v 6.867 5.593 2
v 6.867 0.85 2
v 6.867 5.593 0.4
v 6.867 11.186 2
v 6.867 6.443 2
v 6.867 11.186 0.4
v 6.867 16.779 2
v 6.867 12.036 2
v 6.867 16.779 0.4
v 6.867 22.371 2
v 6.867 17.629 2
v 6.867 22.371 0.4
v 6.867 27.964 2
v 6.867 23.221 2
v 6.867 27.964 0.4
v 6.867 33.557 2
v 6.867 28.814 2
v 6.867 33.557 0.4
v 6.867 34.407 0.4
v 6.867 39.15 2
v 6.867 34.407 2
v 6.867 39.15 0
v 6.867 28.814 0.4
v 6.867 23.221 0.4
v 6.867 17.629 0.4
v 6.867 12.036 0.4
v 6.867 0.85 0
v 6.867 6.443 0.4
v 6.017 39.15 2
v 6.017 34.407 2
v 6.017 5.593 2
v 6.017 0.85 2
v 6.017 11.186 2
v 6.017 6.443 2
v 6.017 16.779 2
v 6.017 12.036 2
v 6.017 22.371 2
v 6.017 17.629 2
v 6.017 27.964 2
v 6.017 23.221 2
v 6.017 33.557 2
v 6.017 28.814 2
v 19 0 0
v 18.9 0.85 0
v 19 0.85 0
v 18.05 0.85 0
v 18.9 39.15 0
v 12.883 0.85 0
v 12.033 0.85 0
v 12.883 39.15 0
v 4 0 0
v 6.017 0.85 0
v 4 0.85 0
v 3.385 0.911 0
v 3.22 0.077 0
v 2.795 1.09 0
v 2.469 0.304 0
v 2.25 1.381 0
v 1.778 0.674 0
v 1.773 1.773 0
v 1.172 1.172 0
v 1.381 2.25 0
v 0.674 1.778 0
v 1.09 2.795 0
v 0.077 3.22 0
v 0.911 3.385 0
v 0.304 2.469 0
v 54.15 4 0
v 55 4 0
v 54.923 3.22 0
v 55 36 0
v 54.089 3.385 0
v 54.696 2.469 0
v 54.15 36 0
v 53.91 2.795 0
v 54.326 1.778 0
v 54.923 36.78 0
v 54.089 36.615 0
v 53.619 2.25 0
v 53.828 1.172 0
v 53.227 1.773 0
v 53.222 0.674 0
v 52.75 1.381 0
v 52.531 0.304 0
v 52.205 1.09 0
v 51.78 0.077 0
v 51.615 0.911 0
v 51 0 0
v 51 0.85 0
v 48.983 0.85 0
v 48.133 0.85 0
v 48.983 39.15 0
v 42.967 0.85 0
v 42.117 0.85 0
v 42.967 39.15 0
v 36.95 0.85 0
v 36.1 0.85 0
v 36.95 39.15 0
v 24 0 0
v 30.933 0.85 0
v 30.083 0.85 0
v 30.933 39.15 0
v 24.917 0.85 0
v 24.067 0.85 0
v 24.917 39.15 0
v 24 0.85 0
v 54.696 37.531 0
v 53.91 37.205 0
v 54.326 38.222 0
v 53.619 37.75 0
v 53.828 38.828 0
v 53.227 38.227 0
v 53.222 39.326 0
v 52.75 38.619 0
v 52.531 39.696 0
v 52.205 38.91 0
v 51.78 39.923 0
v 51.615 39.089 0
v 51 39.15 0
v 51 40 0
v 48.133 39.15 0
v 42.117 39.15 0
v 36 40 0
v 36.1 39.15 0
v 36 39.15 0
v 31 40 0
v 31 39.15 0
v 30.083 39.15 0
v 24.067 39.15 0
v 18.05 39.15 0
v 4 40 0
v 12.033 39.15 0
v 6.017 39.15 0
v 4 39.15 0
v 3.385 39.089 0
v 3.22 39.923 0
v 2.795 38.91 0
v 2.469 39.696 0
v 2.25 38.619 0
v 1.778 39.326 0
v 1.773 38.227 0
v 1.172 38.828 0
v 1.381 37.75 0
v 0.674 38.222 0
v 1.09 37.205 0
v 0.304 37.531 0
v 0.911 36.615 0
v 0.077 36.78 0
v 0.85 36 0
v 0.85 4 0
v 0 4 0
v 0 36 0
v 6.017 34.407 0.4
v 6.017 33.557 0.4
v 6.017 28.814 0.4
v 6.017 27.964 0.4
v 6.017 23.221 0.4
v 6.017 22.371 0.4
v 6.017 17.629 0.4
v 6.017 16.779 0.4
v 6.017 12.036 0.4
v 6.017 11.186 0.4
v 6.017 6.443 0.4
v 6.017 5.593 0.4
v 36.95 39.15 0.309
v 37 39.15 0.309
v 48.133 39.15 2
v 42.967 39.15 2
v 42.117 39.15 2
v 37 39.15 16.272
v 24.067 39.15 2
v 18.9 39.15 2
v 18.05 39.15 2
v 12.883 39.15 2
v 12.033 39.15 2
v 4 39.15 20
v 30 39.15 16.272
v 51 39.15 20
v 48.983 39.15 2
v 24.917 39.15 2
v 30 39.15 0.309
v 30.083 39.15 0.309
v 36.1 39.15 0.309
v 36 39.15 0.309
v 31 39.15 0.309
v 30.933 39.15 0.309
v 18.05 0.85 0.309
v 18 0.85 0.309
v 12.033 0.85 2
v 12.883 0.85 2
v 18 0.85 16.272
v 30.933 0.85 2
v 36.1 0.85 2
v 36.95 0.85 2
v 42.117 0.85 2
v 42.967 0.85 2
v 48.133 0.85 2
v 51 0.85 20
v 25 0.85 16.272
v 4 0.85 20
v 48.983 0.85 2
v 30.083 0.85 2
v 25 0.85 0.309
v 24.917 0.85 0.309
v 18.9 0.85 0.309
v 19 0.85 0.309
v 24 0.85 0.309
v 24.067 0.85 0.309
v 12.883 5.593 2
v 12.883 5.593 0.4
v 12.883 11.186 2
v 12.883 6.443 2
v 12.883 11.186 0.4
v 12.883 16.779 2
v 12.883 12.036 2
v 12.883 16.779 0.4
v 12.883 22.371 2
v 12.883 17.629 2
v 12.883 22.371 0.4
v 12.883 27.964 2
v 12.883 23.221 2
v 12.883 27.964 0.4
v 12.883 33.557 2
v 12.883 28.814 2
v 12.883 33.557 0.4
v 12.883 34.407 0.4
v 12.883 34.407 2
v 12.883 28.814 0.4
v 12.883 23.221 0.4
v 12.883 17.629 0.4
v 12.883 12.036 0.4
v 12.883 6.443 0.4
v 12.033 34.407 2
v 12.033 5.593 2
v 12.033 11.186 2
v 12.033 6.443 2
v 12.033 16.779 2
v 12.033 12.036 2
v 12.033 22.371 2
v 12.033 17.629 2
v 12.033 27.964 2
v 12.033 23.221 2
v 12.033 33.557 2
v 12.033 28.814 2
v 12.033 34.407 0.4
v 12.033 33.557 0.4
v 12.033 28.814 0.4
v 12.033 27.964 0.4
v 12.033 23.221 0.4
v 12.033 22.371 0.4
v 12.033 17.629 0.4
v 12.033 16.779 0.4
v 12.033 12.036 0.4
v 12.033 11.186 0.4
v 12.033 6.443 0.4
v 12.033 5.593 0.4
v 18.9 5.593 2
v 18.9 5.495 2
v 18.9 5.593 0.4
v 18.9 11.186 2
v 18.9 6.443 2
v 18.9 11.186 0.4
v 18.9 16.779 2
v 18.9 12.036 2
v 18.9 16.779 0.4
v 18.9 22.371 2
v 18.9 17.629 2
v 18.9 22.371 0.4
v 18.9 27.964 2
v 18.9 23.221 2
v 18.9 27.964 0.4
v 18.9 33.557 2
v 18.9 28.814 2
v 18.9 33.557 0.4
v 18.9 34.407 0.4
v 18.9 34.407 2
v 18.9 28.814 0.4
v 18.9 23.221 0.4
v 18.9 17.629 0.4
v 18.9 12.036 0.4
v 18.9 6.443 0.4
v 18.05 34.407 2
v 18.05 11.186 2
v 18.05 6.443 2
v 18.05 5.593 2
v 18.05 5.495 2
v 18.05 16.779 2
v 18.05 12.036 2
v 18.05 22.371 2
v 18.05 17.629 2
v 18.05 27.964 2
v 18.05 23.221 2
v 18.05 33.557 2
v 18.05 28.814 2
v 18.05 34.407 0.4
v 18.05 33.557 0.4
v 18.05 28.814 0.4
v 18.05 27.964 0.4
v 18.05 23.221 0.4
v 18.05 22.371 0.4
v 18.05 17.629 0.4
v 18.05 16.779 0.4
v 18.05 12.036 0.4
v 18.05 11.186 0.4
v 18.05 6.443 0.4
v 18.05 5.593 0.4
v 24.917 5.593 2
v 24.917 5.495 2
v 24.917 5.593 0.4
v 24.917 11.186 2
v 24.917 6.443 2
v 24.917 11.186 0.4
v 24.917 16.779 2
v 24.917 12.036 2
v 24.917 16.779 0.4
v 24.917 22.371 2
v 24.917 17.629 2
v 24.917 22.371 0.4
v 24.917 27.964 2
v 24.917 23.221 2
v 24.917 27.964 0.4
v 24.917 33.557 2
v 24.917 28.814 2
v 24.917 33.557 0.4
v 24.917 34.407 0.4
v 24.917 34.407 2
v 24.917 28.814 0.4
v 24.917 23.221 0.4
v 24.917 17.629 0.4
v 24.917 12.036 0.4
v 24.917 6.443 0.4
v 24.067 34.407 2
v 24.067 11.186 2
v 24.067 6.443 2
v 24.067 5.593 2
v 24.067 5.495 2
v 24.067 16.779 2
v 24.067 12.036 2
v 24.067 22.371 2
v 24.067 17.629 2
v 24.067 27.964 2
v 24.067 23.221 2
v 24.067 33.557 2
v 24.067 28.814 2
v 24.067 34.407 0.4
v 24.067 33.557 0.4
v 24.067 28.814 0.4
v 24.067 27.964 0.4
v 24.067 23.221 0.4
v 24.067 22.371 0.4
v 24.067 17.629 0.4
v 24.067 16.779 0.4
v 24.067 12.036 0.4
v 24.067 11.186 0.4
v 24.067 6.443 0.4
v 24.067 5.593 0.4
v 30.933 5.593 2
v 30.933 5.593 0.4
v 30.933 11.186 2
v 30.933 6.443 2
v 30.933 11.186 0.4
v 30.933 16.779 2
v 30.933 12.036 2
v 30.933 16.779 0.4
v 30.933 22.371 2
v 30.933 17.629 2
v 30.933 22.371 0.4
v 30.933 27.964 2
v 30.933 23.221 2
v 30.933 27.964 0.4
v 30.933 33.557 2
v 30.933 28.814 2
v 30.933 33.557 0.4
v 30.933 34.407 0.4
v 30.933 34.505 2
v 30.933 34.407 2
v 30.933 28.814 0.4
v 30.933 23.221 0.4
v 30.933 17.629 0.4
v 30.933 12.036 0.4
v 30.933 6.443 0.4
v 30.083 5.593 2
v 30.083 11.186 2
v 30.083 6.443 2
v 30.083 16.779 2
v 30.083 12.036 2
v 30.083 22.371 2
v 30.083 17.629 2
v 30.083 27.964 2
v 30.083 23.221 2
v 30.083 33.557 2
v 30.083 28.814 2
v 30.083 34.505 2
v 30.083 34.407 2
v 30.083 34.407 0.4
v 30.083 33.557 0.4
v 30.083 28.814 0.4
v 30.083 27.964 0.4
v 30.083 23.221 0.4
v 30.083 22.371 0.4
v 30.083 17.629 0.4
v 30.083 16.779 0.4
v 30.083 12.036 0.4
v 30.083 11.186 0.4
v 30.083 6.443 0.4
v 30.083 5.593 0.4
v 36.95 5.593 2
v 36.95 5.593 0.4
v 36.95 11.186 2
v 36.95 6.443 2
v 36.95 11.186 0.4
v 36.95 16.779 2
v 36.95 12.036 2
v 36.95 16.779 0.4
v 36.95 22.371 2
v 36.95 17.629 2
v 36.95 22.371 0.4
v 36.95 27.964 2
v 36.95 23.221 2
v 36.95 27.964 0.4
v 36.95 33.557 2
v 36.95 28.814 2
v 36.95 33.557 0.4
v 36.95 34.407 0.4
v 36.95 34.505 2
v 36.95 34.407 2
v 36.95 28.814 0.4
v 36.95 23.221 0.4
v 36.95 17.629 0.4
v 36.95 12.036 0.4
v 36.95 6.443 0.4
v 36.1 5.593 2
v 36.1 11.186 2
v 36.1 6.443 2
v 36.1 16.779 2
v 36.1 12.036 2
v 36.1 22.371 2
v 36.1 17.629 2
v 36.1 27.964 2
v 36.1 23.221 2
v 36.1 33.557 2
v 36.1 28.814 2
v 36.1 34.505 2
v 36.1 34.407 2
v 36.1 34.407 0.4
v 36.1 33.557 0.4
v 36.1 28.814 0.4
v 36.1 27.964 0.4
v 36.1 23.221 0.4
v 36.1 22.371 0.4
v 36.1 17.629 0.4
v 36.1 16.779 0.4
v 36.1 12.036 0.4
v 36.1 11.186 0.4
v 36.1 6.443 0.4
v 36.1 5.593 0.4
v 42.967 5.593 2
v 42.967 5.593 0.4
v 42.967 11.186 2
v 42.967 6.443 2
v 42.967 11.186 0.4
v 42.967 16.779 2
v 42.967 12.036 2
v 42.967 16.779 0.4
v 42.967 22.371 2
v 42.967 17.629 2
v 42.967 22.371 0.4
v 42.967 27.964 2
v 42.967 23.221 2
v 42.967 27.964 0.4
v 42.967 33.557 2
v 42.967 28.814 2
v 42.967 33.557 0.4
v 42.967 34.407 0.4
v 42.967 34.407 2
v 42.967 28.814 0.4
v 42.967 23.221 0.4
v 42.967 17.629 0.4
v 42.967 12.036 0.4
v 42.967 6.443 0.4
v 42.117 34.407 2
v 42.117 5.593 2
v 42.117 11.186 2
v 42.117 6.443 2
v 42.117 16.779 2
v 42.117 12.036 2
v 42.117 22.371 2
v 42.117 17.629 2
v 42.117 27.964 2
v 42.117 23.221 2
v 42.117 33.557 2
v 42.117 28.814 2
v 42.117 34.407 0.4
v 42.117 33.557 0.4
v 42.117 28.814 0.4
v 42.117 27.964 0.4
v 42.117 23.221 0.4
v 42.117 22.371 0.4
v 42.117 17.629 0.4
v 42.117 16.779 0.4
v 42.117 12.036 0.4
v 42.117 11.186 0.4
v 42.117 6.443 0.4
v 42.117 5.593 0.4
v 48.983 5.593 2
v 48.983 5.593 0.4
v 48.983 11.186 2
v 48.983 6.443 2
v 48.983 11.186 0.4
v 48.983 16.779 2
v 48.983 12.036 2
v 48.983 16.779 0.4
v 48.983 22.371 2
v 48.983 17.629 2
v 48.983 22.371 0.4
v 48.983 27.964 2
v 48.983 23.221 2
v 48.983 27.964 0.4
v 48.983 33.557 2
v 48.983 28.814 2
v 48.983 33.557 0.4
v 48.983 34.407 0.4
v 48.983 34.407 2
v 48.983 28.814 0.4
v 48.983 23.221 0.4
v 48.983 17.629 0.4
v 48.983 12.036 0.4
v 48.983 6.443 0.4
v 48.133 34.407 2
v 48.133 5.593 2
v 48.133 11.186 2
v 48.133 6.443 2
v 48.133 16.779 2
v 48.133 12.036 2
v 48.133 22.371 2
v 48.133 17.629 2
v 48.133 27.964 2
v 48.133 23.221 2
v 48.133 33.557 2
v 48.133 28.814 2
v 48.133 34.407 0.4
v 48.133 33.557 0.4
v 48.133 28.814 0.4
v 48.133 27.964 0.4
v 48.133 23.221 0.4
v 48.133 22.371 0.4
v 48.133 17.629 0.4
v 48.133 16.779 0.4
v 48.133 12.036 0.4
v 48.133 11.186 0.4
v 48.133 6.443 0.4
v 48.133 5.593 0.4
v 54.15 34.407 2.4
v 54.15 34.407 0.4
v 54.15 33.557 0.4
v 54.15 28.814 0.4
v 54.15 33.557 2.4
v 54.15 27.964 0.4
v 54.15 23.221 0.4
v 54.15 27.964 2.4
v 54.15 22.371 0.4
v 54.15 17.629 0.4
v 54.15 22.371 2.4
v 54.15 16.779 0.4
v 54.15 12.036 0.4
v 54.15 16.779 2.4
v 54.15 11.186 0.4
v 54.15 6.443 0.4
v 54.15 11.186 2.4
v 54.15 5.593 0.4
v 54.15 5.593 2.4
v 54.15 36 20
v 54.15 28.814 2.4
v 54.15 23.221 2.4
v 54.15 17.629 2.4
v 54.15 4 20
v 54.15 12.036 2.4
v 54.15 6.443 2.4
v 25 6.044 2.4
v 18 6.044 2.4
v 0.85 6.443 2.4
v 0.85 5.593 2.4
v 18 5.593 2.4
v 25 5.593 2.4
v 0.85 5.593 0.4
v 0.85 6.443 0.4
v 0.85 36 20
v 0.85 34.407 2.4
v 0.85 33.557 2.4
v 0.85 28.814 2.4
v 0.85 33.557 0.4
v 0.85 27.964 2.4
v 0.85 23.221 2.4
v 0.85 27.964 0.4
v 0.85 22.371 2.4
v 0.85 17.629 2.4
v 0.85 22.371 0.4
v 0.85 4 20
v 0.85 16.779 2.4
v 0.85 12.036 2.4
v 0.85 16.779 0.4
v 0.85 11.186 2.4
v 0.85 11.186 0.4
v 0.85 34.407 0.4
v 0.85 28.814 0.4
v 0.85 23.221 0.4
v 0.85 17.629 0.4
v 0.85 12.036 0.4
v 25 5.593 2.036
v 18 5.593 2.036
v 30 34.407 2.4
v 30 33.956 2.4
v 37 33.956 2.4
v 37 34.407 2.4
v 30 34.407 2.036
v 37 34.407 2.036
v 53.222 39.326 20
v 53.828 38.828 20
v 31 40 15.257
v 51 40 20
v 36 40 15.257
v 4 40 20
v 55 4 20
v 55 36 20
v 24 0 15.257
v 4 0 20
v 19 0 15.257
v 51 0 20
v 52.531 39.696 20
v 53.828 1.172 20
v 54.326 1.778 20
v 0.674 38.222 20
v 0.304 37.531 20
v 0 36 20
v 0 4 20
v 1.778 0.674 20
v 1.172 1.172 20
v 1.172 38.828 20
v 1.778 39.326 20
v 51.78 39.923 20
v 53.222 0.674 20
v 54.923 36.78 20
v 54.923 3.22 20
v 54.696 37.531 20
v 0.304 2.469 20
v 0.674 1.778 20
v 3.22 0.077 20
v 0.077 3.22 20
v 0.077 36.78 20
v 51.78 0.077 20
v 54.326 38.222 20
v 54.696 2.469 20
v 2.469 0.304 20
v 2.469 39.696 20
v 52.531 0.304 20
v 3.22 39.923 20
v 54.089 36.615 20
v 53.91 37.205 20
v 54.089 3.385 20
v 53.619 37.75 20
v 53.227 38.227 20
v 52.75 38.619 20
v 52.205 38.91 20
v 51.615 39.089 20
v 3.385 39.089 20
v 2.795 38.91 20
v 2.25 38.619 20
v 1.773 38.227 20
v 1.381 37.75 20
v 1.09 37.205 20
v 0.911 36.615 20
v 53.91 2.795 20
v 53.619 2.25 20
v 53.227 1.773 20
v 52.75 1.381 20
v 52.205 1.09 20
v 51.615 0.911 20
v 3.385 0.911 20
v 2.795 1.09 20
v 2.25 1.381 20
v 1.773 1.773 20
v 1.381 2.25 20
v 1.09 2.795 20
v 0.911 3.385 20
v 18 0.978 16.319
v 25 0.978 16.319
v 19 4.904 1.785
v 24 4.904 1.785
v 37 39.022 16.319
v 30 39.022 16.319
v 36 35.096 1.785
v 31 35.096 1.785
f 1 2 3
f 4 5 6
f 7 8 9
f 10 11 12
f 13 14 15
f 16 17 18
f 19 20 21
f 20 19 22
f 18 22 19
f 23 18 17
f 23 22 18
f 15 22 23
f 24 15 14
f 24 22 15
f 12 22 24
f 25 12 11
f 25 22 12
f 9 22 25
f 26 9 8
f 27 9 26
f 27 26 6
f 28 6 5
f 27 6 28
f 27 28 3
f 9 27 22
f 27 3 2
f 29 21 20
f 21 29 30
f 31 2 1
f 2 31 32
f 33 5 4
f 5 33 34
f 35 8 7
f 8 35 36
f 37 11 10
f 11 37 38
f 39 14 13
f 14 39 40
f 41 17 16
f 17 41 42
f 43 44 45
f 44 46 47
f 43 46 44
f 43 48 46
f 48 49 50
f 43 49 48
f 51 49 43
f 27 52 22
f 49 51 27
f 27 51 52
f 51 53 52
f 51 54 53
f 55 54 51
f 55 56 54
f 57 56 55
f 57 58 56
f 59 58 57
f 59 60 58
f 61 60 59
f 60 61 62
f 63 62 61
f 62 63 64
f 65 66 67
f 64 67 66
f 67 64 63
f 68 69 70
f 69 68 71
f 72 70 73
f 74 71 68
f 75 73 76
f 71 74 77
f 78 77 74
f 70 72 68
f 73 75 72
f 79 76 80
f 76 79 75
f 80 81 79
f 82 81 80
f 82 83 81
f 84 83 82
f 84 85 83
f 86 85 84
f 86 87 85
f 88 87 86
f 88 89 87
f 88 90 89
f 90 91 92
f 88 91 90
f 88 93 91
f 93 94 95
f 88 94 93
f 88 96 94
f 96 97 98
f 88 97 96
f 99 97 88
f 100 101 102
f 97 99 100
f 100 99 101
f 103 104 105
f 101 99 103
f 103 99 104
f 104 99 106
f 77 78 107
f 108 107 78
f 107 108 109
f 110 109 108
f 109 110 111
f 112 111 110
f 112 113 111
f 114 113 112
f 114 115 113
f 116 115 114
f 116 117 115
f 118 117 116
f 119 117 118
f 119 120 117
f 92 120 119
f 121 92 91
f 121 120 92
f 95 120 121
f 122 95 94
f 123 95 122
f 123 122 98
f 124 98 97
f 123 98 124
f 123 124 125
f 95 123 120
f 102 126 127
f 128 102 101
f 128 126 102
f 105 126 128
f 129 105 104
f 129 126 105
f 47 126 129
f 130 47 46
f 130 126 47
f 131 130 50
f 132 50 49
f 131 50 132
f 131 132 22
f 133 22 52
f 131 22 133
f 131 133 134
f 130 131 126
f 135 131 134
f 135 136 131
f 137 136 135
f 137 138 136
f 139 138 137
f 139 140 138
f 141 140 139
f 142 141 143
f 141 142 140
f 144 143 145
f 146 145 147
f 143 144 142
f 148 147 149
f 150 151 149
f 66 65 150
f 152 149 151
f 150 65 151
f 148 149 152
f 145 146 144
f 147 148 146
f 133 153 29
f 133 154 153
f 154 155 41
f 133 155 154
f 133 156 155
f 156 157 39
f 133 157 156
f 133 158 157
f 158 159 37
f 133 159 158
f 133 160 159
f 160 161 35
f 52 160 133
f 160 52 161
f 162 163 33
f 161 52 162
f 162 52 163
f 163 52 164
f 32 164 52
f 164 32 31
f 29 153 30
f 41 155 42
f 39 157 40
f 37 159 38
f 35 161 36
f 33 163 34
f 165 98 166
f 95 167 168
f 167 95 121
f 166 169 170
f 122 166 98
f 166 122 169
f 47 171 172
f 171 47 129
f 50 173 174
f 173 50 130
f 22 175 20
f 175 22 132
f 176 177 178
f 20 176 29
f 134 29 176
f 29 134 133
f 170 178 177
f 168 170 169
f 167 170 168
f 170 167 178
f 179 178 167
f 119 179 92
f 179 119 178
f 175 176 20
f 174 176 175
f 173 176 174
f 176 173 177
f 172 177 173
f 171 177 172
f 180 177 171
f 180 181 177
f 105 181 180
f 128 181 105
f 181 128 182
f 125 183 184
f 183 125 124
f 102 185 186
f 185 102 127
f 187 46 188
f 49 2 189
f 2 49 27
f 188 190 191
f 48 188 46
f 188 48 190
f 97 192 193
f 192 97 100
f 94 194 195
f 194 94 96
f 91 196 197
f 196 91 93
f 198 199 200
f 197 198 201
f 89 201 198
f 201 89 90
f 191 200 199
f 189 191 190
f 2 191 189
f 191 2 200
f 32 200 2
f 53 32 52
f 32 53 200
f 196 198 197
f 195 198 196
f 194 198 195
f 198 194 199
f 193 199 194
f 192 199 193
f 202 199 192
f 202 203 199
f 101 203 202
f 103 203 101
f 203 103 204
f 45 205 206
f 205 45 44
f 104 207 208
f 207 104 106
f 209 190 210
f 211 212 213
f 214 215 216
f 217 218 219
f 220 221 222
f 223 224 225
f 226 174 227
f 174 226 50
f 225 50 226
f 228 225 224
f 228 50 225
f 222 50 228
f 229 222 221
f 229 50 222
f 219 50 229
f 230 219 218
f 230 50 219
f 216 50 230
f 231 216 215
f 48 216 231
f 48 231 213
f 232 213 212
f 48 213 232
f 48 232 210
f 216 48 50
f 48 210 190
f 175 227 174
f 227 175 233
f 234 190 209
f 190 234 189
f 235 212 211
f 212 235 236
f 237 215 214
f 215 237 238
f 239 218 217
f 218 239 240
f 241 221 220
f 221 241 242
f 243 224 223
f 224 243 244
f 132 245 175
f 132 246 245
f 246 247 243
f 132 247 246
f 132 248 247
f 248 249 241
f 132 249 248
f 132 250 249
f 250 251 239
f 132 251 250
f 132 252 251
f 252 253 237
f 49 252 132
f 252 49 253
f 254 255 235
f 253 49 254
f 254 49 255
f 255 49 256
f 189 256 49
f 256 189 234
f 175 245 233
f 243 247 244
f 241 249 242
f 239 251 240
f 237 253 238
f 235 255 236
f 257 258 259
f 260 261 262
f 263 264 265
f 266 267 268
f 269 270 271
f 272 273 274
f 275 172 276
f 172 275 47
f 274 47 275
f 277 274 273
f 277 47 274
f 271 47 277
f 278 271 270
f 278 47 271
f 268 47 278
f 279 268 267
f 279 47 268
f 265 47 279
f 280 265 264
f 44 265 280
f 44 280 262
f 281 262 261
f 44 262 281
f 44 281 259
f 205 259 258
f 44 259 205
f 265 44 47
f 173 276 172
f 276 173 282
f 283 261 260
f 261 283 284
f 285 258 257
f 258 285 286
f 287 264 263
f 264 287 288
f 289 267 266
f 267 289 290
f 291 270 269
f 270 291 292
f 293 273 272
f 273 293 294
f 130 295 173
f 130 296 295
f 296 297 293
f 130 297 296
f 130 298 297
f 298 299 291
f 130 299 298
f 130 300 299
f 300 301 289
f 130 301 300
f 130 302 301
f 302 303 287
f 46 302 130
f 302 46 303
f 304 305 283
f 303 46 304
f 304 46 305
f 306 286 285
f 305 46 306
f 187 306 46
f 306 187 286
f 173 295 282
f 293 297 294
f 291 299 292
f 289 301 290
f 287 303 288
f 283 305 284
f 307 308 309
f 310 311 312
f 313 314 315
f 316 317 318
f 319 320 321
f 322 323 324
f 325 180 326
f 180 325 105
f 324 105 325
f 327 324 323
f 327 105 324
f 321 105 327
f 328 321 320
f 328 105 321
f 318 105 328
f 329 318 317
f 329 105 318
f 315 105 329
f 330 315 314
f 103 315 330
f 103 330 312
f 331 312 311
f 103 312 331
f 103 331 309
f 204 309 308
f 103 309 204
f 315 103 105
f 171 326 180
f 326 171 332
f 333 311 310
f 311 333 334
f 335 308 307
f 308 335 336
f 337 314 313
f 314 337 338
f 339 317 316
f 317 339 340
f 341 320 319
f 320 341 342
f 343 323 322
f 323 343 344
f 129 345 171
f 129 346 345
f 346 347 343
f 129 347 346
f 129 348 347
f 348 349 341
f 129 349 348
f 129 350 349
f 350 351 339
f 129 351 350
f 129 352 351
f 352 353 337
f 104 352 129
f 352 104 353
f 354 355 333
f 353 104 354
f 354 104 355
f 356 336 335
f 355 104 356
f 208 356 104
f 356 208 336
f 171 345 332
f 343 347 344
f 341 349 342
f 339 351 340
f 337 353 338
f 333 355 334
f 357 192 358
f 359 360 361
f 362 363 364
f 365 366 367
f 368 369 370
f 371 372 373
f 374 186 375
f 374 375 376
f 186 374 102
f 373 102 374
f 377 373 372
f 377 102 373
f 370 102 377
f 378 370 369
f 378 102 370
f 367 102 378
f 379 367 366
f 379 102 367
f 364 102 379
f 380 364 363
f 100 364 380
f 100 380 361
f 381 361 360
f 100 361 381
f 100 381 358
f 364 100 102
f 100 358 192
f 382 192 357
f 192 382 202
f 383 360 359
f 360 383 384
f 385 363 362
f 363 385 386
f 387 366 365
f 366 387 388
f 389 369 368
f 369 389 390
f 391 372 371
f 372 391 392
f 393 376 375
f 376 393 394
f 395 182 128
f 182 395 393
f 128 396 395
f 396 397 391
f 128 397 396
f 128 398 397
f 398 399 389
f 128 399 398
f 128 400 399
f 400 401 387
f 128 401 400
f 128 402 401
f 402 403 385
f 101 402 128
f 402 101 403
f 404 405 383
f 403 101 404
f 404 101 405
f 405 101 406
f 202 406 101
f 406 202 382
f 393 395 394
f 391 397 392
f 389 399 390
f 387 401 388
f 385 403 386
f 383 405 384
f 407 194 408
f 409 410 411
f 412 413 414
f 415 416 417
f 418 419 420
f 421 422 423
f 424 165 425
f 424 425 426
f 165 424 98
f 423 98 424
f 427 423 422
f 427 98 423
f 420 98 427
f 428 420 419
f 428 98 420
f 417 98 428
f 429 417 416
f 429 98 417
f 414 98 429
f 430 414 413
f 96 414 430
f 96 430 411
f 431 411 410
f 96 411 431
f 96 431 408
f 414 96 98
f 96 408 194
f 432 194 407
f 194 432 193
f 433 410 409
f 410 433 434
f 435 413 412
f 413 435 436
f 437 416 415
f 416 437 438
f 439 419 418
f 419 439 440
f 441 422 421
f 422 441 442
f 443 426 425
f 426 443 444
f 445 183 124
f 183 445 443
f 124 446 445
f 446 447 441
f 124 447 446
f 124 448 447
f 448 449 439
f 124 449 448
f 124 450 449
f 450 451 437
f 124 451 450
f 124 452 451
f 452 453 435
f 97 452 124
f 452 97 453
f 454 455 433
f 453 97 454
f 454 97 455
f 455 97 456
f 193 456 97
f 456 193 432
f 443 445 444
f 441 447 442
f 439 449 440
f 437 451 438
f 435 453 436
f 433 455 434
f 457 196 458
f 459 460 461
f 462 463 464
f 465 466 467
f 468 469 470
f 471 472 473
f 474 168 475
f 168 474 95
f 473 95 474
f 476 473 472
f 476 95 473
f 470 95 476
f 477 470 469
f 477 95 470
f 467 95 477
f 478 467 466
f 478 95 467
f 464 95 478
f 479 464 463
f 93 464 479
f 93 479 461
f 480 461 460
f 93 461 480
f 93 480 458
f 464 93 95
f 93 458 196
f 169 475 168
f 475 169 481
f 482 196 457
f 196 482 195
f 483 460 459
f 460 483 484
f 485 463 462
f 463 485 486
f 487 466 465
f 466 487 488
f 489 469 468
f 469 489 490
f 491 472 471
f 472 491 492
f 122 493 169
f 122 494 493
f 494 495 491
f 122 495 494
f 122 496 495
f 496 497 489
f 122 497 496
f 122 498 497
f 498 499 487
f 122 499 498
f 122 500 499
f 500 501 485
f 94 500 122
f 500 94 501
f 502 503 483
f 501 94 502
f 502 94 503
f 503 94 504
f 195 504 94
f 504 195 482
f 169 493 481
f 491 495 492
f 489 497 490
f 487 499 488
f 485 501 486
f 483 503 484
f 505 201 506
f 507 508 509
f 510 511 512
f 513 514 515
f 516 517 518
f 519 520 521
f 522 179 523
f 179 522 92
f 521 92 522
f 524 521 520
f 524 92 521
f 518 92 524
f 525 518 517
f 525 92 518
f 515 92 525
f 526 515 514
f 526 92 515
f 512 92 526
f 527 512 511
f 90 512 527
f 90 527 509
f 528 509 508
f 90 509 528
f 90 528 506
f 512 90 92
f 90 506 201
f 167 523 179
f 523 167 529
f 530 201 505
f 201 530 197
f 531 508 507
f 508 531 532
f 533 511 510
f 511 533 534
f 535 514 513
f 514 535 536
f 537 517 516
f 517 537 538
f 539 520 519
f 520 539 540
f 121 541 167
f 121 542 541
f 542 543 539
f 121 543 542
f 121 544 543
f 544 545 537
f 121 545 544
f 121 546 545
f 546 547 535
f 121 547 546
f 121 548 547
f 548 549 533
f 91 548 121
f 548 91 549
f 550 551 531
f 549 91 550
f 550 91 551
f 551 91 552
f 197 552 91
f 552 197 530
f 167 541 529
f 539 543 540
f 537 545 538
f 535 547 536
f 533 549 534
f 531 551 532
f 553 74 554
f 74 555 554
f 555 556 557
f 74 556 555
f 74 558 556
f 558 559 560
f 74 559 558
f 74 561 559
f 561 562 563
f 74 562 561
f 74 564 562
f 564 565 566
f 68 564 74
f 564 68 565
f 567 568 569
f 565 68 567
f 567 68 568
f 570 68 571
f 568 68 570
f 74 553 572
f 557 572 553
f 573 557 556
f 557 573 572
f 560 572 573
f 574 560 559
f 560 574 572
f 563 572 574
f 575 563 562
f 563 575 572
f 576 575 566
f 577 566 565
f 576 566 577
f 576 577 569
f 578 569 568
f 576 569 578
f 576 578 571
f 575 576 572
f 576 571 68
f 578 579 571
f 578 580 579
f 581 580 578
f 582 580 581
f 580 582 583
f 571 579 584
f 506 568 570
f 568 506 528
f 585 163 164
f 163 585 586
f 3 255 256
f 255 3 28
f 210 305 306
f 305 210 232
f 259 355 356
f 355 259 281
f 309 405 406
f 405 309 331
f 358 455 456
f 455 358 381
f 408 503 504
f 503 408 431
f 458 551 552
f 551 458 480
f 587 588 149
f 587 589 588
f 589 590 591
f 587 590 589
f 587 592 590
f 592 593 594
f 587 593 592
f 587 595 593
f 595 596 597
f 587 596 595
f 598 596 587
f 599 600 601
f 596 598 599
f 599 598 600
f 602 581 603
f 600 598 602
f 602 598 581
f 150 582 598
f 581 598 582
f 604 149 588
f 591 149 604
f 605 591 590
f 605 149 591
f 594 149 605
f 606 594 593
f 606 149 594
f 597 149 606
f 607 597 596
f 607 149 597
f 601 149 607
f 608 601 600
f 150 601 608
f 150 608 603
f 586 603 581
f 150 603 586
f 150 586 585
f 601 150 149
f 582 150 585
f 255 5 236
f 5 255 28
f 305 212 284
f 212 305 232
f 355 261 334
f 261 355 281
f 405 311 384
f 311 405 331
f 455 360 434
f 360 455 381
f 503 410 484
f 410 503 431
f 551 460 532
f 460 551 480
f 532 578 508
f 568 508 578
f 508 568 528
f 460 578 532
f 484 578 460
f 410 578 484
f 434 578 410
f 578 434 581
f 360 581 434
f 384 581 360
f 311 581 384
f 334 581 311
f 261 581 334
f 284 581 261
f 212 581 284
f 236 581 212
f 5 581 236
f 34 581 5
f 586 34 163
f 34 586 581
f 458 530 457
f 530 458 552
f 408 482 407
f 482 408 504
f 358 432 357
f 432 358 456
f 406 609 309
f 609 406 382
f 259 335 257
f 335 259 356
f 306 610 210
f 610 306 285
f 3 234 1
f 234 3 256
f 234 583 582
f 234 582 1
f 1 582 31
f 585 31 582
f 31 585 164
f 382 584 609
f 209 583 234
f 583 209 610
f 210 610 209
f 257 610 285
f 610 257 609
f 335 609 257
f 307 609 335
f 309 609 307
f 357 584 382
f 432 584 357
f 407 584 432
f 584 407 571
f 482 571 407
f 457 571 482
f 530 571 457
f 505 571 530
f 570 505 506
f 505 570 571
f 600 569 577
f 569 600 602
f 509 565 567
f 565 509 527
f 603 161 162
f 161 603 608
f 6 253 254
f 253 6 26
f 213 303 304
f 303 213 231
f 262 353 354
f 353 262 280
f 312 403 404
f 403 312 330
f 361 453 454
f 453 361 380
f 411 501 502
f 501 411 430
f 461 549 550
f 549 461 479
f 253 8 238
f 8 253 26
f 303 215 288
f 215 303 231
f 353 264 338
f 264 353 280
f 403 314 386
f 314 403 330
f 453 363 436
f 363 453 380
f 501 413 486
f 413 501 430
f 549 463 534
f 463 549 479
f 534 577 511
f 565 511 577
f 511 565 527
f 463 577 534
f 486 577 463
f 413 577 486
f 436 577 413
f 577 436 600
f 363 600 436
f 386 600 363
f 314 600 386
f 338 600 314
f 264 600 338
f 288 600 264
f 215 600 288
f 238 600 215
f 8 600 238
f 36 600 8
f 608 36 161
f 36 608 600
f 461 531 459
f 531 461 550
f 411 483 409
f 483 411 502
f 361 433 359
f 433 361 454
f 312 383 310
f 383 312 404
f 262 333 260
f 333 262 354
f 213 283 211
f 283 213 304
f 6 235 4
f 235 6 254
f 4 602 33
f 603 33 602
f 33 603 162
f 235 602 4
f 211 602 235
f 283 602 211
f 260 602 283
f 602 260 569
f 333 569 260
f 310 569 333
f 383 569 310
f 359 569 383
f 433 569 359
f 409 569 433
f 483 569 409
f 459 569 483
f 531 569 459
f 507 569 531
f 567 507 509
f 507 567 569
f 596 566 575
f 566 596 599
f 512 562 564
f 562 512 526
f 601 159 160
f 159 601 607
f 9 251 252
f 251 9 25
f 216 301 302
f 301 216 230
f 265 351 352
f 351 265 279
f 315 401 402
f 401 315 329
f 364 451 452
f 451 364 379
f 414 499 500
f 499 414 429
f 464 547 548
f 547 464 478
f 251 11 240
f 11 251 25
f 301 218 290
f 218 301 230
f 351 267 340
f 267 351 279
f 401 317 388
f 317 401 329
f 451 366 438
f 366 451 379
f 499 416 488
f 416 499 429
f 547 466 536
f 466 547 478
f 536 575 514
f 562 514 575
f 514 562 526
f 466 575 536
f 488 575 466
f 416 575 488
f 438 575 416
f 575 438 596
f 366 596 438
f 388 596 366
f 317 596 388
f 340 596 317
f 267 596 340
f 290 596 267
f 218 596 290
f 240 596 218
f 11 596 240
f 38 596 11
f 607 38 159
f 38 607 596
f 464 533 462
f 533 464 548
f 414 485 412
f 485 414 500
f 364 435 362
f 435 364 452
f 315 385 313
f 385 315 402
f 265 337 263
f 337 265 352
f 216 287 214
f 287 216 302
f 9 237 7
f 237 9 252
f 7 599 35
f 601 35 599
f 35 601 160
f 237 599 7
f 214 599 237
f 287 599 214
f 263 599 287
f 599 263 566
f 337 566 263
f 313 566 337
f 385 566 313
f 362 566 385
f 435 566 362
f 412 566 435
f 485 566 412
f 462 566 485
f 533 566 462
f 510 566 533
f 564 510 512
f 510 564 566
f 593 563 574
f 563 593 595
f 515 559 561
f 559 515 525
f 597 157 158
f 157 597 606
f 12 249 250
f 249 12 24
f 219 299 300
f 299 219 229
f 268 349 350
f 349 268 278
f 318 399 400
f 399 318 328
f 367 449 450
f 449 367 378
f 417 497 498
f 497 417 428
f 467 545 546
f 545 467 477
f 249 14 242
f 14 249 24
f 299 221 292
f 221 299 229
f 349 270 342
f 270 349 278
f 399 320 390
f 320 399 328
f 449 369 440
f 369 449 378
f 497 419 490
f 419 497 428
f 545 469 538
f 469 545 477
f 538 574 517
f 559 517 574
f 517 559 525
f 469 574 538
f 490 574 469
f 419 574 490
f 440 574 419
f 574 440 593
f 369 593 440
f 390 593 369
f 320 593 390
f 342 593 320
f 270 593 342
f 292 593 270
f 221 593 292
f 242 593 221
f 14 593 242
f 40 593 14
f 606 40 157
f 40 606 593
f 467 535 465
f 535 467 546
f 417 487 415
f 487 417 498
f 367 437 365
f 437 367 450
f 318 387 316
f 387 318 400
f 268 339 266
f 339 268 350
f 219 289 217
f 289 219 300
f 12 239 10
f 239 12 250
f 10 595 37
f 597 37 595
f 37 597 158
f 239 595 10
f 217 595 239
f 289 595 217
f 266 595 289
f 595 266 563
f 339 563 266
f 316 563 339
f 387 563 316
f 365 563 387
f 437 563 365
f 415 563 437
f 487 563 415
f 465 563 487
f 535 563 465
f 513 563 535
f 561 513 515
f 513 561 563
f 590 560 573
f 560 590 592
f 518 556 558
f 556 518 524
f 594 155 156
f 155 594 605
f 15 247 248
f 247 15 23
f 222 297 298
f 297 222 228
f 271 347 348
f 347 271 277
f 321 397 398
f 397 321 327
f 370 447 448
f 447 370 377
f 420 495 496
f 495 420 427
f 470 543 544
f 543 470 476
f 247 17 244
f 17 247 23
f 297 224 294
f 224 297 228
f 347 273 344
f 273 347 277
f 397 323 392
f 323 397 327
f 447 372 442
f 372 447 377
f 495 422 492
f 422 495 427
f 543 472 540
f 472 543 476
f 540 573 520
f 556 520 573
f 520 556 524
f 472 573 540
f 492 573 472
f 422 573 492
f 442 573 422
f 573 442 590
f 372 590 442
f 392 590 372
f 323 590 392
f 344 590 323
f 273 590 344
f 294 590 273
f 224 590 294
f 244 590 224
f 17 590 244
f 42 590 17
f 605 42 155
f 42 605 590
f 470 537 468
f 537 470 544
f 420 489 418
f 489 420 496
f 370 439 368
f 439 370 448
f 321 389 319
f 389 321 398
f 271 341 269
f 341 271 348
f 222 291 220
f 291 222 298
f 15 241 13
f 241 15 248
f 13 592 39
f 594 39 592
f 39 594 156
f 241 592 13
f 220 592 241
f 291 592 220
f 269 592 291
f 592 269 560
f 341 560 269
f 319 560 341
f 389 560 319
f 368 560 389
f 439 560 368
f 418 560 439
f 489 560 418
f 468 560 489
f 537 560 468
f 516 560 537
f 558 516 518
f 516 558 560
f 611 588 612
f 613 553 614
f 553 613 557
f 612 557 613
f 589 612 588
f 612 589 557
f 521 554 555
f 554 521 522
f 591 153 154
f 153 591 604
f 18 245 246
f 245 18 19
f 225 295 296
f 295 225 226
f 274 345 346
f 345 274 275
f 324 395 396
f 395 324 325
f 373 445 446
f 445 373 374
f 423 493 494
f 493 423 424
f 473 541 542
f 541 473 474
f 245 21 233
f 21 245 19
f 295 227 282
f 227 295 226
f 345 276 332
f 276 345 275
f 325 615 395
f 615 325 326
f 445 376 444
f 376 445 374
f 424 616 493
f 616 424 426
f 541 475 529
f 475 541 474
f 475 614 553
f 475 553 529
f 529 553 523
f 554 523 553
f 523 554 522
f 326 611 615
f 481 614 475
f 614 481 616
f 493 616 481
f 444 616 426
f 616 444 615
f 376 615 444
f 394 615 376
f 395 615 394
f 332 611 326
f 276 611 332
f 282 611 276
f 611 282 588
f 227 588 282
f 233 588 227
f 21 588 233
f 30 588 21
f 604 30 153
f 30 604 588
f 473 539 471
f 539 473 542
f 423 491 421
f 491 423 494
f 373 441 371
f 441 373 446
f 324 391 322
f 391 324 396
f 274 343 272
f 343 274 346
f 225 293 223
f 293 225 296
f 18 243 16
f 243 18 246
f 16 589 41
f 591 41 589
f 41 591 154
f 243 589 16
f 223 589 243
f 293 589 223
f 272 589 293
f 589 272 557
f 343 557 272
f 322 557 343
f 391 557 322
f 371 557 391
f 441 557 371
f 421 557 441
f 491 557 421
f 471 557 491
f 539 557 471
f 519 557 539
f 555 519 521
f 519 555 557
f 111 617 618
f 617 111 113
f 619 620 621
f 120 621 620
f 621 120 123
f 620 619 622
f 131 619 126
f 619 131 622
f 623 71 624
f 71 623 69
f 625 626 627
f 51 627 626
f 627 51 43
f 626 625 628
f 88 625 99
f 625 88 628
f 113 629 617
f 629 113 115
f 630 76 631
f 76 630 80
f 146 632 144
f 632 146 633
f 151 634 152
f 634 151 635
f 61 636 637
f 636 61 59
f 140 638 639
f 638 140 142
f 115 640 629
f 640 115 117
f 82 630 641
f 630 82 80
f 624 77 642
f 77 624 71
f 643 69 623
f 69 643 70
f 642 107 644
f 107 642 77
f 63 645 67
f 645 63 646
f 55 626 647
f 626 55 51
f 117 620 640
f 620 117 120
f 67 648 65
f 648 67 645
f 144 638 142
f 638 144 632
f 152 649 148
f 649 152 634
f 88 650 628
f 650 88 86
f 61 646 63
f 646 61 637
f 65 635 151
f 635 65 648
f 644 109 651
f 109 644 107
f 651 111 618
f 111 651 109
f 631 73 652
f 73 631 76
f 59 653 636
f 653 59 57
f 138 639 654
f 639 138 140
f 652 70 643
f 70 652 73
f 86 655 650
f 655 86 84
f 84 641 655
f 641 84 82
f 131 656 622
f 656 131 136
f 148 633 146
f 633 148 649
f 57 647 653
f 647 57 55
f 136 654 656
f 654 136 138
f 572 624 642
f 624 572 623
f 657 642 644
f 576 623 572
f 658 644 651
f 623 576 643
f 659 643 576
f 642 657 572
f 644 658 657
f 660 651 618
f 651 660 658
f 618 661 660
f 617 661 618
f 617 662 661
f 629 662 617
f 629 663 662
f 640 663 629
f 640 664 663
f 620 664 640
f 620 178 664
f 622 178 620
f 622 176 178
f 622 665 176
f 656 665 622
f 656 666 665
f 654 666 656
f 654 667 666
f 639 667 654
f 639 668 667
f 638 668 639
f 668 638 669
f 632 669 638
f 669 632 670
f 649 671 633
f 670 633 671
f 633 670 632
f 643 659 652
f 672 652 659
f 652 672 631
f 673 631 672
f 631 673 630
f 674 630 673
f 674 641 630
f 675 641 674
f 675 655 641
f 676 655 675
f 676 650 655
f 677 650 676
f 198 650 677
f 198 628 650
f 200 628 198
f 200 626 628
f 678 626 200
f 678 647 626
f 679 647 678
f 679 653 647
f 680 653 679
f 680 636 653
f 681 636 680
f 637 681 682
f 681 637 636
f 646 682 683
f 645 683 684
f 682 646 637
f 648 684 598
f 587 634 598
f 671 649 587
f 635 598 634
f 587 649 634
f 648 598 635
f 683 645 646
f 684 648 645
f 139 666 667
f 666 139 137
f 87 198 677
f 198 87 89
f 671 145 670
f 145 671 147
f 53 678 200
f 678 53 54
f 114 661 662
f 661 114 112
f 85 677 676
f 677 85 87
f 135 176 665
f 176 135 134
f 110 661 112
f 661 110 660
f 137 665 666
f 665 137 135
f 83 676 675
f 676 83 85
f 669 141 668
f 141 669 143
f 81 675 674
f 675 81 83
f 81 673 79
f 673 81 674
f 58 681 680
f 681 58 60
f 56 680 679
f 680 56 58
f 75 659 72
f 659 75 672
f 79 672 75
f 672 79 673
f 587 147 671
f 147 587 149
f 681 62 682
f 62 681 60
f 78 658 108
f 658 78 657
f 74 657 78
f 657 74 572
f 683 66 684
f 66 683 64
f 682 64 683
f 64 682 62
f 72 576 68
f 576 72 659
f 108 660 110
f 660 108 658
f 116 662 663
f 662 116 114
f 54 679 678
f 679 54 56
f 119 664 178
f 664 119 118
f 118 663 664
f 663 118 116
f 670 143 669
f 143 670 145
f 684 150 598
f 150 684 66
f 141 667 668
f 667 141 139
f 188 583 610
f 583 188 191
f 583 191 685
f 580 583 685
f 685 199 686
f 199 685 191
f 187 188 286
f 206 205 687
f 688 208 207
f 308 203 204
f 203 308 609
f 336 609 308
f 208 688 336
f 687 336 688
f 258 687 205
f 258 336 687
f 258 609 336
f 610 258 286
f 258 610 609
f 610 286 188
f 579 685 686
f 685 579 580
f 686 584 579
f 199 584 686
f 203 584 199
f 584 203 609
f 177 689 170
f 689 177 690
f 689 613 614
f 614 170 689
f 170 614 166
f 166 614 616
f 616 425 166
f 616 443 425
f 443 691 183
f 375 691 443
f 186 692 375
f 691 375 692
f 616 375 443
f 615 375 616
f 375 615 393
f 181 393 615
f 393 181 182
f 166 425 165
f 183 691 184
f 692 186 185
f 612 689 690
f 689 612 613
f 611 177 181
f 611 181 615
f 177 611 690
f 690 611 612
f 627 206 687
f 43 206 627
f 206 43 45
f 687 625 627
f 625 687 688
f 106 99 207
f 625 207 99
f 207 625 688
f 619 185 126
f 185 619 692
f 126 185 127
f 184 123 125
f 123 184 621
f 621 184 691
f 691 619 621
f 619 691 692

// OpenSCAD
thickness = 0.85;
size_x=55;
size_y=40;

module mesh() {
    holes_x=9;
    holes_y=7;
    
    hole_x = (size_x - thickness) / holes_x;
    hole_y = (size_y - thickness) / holes_y;
    echo([hole_x,hole_y]);
    
        /*
        for(dx=[0.5:holes_x-1]) {
            for(dy=[0.5:holes_y-1]) {
                translate([thickness + dx * (hole_x+thickness),         thickness + dy * (hole_y+thickness),-1])
                    cube([hole_x, hole_y, 100]);
            }
        }*/
        
        
        for(dx=[1:holes_x-1]) {
                translate([dx * hole_x,thickness])
                    cube([thickness, size_y-2*thickness, 2]);
        }
        for(dy=[1:holes_y-1]) {
                translate([thickness, dy * hole_y,0.4])
                    cube([size_x-2*thickness, thickness, 2]);
        }
       
     
}

module border() {
    rad = 4;
    $fn=32;
    difference() {
        hull() {
            translate([rad,rad])
                cylinder(r=rad,h=20);
            translate([size_x-rad,rad])
                cylinder(r=rad,h=20);
            translate([size_x-rad,size_y-rad])
                cylinder(r=rad,h=20);
            translate([rad,size_y-rad])
                cylinder(r=rad,h=20);
        }
        translate([0,0,-1])
        hull() {
            translate([rad,rad])
                cylinder(r=rad-thickness,h=22);
            translate([size_x-rad,rad])
                cylinder(r=rad-thickness,h=22);
            translate([size_x-rad,size_y-rad])
                cylinder(r=rad-thickness,h=22);
            translate([rad,size_y-rad])
                cylinder(r=rad-thickness,h=22);
        }
    }
}
intersection() {
    difference() {
        union() {
            mesh();
            border();
            translate([18,0])
                rotate([20,0])
                cube([7,6.5,15]);
            translate([size_x, size_y])
                mirror([0,1,0])
                mirror([1,0,0])
                translate([18,0])
                rotate([20,0])
                    cube([7,6.5,15]);
        }
        
        translate([19,-1,-1])
            rotate([20,0])
            cube([5,6.5,17]);
        
        translate([size_x, size_y])
            mirror([0,1,0])
            mirror([1,0,0])
            translate([19,-1,-1])
            rotate([20,0])
                    cube([5,6.5,17]);
        
    }
    hull(){ border(); }
}
